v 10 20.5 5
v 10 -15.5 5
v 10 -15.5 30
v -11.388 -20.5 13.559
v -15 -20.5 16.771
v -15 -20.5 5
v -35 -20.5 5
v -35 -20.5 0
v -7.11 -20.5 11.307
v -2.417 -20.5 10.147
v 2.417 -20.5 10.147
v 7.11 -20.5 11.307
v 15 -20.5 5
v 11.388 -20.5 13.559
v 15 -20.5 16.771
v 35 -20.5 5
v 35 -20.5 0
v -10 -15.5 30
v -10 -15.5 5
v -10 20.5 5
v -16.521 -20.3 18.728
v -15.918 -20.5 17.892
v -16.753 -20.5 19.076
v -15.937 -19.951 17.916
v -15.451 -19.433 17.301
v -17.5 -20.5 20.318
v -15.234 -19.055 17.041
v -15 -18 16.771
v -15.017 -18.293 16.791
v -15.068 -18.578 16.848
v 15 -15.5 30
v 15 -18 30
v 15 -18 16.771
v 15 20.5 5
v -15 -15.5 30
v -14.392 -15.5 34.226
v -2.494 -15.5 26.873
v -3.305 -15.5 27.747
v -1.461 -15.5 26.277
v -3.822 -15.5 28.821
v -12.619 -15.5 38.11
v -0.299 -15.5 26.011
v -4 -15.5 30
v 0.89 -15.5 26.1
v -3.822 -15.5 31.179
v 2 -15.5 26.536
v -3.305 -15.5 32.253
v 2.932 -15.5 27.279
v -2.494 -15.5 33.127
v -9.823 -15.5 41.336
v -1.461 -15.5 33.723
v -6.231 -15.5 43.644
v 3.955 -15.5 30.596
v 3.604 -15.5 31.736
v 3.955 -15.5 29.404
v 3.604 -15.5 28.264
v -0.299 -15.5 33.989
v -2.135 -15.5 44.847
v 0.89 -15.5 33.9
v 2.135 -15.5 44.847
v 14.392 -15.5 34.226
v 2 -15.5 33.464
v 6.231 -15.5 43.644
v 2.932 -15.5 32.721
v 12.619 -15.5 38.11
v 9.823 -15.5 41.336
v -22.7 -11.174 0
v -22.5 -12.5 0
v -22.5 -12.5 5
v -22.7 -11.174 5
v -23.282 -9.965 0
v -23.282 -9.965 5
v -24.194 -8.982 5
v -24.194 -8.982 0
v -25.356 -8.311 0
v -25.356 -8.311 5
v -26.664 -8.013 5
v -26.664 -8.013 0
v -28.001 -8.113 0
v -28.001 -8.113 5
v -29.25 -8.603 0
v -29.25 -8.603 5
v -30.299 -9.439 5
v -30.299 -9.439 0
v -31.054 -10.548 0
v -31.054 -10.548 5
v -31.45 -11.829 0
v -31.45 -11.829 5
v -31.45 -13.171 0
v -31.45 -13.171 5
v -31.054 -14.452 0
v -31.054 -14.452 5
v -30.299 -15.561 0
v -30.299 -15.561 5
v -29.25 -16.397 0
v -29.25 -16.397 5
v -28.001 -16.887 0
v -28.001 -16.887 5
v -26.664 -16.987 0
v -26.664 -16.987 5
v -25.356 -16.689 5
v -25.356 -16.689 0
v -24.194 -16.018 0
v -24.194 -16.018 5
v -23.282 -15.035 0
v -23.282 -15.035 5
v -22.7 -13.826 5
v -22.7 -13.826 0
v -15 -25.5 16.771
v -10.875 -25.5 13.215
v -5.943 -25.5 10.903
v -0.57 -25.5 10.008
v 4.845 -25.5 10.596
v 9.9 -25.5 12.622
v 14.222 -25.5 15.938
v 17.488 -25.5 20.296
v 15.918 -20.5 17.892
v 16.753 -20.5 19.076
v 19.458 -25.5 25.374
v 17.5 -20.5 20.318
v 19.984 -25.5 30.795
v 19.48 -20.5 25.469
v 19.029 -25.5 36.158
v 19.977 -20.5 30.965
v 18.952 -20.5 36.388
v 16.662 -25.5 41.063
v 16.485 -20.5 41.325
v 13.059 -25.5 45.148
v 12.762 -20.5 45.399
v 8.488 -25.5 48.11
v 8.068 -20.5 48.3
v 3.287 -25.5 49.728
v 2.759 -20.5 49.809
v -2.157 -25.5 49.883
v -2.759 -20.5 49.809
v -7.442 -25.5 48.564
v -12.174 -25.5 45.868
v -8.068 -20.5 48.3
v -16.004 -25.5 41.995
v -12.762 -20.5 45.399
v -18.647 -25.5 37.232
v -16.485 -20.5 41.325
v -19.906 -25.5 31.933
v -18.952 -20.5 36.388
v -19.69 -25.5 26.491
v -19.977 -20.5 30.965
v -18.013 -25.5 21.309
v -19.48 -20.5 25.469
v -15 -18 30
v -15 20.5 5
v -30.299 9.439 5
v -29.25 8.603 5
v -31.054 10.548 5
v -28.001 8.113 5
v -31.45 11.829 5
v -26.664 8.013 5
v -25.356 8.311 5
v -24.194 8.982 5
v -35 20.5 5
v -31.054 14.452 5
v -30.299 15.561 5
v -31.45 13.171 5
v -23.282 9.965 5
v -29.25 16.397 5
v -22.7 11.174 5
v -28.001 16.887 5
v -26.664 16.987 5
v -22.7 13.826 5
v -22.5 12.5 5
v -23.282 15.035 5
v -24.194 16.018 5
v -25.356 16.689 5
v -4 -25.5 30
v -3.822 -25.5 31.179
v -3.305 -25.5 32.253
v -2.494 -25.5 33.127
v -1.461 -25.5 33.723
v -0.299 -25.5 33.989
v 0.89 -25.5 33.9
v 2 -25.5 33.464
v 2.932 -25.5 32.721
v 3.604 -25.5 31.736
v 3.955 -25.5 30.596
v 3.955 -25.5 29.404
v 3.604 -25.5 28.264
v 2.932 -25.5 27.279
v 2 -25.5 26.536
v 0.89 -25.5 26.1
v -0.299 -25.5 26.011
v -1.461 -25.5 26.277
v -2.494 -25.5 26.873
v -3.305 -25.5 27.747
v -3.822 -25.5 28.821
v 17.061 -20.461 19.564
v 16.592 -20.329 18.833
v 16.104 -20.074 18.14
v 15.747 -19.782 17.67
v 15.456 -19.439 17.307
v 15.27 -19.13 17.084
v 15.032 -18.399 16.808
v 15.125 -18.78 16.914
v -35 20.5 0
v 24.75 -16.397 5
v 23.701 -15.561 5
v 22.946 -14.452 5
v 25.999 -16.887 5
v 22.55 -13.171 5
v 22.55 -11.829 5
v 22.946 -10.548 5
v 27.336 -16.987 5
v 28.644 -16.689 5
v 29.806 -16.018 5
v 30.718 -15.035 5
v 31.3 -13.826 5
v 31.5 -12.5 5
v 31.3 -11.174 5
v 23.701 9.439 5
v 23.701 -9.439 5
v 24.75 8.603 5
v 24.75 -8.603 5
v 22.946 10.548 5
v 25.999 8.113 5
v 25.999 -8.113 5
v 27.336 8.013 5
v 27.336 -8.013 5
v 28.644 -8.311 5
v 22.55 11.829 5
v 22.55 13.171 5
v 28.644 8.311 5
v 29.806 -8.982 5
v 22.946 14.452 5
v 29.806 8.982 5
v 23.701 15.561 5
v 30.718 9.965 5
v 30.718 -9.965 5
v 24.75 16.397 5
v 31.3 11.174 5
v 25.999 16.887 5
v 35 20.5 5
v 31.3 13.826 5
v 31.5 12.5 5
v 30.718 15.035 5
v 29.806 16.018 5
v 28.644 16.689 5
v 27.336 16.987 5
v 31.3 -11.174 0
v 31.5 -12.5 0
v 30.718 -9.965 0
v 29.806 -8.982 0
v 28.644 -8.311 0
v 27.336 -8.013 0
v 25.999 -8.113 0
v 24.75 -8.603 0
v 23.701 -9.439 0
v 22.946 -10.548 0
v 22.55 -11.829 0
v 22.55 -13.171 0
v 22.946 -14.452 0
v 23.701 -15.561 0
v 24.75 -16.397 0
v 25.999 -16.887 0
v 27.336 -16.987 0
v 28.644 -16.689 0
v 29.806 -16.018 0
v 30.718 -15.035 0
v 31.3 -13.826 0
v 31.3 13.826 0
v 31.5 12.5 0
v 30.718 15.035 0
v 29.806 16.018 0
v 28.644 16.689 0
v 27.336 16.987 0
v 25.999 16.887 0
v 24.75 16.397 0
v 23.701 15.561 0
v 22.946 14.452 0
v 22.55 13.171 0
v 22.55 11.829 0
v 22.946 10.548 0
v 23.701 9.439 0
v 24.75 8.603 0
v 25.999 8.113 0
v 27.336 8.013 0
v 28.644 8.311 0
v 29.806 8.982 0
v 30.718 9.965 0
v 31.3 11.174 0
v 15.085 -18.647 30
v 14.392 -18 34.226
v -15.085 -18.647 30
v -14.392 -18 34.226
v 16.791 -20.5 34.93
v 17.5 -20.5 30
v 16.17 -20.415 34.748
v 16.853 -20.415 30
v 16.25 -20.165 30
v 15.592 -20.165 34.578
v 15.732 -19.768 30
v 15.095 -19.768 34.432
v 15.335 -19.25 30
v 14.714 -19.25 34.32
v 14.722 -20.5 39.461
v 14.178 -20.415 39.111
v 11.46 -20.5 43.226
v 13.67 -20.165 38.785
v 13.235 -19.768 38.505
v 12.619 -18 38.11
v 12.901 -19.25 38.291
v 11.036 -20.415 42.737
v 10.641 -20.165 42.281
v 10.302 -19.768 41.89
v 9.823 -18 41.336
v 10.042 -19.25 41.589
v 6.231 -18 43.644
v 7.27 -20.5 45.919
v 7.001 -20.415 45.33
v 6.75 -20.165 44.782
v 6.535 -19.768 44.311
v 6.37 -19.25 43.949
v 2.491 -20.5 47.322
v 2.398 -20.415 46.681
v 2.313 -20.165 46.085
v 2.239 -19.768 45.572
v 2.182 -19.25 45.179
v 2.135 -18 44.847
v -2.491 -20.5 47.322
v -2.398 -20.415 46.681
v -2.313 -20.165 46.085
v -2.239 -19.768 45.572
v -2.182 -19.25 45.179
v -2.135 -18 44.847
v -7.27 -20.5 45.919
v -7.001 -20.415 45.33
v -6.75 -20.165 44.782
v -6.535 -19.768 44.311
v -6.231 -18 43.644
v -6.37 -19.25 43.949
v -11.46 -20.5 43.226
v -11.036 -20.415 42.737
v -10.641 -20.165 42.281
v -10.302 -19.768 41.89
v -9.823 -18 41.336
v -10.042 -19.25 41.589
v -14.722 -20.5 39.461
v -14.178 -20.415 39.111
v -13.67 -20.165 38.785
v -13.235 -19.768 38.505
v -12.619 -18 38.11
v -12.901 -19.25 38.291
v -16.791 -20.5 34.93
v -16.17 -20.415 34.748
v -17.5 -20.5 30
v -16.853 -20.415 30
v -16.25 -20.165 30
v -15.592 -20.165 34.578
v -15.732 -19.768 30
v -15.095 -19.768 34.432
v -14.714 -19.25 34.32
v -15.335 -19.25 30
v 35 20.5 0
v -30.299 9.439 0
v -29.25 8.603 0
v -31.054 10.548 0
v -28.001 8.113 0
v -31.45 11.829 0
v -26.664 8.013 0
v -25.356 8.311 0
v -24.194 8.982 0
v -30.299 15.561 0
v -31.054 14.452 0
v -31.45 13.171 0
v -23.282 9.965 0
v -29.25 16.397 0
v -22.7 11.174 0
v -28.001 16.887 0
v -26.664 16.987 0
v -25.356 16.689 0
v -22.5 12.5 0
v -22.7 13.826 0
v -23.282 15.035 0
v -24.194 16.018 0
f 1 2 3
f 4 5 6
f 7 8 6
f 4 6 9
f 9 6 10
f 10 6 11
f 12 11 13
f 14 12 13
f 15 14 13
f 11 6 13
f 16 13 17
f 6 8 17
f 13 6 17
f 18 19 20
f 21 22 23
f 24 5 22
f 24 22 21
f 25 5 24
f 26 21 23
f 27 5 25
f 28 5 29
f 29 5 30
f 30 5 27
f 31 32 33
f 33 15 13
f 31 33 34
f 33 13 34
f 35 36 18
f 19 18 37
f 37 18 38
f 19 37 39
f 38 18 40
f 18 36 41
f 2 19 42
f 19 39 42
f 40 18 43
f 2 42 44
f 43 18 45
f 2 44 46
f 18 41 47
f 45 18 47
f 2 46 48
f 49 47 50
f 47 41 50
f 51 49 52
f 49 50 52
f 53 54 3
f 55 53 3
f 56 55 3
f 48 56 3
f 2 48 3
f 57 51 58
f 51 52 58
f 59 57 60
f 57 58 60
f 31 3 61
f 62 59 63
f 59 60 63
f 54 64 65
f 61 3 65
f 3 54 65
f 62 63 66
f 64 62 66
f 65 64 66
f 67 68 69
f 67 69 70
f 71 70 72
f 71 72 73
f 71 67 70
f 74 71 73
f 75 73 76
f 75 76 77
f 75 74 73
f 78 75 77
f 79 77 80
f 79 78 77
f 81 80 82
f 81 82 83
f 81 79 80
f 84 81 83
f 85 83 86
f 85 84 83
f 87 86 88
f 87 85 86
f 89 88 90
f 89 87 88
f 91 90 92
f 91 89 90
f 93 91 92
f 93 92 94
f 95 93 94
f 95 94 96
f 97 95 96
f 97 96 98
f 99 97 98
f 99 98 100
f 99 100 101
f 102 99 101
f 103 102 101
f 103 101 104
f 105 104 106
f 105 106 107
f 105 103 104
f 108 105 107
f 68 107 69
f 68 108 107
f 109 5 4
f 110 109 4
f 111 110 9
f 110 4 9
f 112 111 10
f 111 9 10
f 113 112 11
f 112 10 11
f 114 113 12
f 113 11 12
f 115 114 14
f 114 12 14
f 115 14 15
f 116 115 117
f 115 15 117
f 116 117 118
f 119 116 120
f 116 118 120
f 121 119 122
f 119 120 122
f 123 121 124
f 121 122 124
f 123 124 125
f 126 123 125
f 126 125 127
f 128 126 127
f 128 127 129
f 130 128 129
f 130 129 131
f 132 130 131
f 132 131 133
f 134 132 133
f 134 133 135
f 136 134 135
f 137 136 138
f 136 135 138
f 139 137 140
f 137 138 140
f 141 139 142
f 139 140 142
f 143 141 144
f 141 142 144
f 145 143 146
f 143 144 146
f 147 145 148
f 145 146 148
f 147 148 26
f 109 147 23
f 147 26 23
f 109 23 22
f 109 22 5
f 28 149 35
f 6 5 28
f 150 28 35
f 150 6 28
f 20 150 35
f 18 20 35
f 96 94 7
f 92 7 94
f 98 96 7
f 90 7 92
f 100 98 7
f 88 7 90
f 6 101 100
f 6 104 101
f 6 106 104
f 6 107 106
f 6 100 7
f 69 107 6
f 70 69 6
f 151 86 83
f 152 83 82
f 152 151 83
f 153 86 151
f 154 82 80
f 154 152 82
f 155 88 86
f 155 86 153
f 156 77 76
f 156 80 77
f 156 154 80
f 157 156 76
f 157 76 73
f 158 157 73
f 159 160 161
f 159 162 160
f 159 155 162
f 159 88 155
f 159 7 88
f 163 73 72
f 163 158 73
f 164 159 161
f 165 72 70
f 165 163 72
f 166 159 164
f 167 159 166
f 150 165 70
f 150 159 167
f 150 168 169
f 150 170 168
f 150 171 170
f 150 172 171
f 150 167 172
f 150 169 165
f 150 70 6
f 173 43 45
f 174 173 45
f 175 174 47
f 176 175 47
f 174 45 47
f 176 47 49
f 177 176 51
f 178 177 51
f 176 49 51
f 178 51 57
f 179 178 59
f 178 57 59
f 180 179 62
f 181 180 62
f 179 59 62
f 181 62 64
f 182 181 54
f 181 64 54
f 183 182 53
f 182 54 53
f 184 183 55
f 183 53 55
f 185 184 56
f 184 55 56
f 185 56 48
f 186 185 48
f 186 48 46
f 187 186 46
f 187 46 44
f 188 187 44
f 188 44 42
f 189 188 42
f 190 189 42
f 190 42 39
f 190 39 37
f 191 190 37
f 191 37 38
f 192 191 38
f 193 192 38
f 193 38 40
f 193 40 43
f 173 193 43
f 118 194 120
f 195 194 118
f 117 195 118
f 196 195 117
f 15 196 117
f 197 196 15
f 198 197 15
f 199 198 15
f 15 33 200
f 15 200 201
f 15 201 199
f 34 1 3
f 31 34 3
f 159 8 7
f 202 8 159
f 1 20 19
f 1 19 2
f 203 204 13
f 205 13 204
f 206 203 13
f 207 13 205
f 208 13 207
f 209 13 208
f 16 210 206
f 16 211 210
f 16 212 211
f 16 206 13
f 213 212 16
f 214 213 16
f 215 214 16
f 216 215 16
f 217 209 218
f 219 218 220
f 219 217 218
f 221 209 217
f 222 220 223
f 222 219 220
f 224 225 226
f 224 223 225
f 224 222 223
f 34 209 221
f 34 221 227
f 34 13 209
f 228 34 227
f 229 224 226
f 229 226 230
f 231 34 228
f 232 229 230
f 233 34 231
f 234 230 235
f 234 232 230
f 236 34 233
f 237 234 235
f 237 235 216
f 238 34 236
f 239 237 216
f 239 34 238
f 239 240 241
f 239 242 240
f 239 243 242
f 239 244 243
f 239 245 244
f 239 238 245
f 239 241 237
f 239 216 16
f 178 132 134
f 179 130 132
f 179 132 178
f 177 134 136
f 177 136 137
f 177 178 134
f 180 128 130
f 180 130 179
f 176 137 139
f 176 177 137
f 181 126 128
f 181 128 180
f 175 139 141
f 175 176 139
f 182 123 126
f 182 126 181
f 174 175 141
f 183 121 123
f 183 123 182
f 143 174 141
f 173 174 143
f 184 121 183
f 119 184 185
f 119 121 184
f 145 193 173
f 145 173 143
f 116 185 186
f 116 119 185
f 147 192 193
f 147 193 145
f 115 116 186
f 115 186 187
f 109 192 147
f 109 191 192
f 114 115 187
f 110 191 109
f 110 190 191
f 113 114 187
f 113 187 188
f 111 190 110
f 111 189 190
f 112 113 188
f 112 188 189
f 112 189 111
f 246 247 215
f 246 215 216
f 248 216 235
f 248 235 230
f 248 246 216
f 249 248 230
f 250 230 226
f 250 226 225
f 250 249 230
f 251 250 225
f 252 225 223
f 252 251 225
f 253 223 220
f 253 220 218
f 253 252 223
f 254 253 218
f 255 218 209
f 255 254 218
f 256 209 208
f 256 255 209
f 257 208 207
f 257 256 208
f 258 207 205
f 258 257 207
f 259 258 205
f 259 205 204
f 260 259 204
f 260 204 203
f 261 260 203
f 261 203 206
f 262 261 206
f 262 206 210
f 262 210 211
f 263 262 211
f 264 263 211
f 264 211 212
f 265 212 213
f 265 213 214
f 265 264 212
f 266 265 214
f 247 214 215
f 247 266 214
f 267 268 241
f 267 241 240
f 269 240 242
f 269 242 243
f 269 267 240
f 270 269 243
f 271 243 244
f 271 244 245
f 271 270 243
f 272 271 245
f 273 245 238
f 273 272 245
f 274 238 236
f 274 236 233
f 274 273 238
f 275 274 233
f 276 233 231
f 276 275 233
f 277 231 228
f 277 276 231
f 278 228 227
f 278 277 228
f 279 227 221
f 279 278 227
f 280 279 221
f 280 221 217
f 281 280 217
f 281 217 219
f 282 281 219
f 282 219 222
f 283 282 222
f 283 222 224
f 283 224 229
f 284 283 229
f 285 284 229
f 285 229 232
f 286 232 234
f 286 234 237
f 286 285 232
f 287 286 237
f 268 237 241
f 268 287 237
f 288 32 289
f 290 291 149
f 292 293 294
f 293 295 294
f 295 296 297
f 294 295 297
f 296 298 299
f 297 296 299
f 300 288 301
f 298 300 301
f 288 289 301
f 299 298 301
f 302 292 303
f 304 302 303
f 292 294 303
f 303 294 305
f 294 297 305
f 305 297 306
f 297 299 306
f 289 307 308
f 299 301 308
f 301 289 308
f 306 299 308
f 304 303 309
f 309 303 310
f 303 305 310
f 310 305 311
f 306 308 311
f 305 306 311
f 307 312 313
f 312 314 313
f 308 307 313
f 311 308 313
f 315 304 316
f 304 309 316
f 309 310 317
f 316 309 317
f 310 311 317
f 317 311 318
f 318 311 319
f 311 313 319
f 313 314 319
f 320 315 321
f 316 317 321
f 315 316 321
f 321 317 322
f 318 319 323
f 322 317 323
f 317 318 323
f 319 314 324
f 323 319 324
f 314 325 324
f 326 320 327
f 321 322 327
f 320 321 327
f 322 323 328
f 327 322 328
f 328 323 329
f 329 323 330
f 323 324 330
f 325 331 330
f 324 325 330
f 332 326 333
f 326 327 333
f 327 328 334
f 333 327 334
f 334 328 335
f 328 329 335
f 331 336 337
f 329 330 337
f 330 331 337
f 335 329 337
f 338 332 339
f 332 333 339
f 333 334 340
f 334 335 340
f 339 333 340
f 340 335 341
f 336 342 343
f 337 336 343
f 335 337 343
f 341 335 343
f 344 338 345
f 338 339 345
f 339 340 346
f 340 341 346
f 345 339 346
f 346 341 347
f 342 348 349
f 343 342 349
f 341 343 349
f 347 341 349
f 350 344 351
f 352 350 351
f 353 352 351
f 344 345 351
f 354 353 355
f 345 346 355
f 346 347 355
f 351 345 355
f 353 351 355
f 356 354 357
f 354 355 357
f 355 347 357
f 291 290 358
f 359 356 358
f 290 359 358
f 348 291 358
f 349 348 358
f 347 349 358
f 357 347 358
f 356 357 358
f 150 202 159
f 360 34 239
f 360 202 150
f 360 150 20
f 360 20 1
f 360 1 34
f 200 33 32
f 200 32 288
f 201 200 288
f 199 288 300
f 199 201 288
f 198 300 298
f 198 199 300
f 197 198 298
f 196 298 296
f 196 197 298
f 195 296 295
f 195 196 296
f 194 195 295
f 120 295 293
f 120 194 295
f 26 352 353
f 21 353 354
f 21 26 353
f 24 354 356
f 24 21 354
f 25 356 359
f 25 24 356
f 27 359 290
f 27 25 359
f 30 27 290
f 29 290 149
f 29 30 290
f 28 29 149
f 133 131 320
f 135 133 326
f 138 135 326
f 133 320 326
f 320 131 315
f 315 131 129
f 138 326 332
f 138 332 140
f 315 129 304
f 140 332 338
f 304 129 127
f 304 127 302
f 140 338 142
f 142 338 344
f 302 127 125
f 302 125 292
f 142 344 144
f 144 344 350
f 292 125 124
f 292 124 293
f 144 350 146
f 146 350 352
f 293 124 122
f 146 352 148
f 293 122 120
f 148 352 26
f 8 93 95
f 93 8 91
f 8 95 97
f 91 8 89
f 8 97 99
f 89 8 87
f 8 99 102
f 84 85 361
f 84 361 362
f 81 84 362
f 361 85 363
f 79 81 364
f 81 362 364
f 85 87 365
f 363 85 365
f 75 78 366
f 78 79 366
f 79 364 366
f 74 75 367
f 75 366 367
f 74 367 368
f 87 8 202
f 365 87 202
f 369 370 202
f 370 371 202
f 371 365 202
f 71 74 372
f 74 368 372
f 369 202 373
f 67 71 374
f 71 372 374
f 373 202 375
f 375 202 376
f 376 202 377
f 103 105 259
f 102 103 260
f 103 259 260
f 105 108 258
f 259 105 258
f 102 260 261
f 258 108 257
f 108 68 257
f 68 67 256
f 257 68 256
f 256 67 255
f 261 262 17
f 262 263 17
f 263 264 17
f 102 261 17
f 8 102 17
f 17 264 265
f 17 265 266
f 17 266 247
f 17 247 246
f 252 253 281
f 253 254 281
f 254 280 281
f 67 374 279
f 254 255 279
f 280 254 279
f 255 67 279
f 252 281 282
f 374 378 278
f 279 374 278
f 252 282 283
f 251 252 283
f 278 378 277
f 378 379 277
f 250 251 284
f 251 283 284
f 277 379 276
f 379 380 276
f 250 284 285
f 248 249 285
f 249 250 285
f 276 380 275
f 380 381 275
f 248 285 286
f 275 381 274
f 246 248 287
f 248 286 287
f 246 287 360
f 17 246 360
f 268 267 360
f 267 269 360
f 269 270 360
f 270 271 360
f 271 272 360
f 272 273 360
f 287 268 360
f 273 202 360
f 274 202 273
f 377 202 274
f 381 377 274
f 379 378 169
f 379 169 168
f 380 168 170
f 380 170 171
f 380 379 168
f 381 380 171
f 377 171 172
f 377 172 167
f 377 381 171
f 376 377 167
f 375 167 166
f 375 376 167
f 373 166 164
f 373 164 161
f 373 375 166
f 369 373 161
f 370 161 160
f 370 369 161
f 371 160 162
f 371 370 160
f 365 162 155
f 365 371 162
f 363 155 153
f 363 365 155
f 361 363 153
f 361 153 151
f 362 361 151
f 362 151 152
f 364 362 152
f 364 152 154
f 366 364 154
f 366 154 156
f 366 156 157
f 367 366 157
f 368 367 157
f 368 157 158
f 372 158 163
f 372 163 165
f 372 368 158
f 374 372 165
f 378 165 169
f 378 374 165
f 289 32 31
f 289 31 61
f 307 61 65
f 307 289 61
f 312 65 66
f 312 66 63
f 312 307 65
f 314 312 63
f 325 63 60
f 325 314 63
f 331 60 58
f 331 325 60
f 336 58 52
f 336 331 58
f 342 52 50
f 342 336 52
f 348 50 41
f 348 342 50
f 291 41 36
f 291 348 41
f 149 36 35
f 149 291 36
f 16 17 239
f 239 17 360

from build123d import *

# Parameters (mm, degrees)
SKETCH1_W               = 70
SKETCH1_H               = 41
SKETCH1_R               = 4.5
BOSS_EXTRUDE1_DEPTH     = 5
SKETCH2_W               = 5
SKETCH2_H               = 41
BOSS_EXTRUDE2_DEPTH     = 25
BOSS_EXTRUDE3_DEPTH     = 5
CUT_EXTRUDE2_DEPTH      = 61.582588258
CUT_EXTRUDE2_DEPTH_BACK = 61.582588258
SKETCH6_R               = 20
BOSS_EXTRUDE4_DEPTH     = 5
SKETCH7_R               = 4
CUT_EXTRUDE3_DEPTH      = 71.859014952
FILLET1_R               = 2.5


with BuildPart() as part:
    # Sketch1 → Boss-Extrude1 (new body)
    with BuildSketch(Plane.XY):
        Rectangle(SKETCH1_W, SKETCH1_H)
        with Locations((-27, 12.5)):
            Circle(SKETCH1_R, mode=Mode.SUBTRACT)
        with Locations((-27, -12.5)):
            Circle(SKETCH1_R, mode=Mode.SUBTRACT)
        with Locations((27, 12.5)):
            Circle(SKETCH1_R, mode=Mode.SUBTRACT)
        with Locations((27, -12.5)):
            Circle(SKETCH1_R, mode=Mode.SUBTRACT)
    extrude(amount=BOSS_EXTRUDE1_DEPTH)

    # Sketch2 → Boss-Extrude2 (add)
    with BuildSketch(Plane.XY.offset(5)):
        with Locations((-12.5, 0)):
            Rectangle(SKETCH2_W, SKETCH2_H)
        with Locations((12.5, 0)):
            Rectangle(SKETCH2_W, SKETCH2_H)
    extrude(amount=BOSS_EXTRUDE2_DEPTH)

    # Sketch5 → Boss-Extrude3 (add)
    with BuildSketch(Plane.XZ.offset(20.5)):
        with BuildLine():
            Line((-15, 30), (-15, 5))
            Line((-15, 5), (15, 5))
            Line((15, 5), (15, 30))
            ThreePointArc((15, 30), (0, 45), (-15, 30))
        make_face()
    extrude(amount=-BOSS_EXTRUDE3_DEPTH)

    # Sketch3 → Cut-Extrude2 (cut, two sides: drawn at the far end of the back side and taken through both)
    with BuildSketch(Plane(origin=(0, 0, 0), x_dir=(0, 0, -1), z_dir=(1, 0, 0)).offset(-CUT_EXTRUDE2_DEPTH_BACK)):
        Polygon((-5, 20.5), (-30, -15.5), (-49.542972481, -15.5), (-49.542972481, 23.944363396), (-5, 23.944363396), align=None)
    extrude(amount=CUT_EXTRUDE2_DEPTH + CUT_EXTRUDE2_DEPTH_BACK, mode=Mode.SUBTRACT)

    # Sketch6 → Boss-Extrude4 (add)
    with BuildSketch(Plane.XZ.offset(20.5)):
        with Locations(Location((0, 30, 0), (0, 0, 221.409622109))):
            Circle(SKETCH6_R)
    extrude(amount=BOSS_EXTRUDE4_DEPTH)

    # Sketch7 → Cut-Extrude3 (cut, through all)
    with BuildSketch(Plane(origin=(0, -15.5, 0), x_dir=(1, 0, 0), z_dir=(0, 1, 0))):
        with Locations(Location((0, -30, 0), (0, 0, 180))):
            Circle(SKETCH7_R)
    extrude(amount=-CUT_EXTRUDE3_DEPTH, mode=Mode.SUBTRACT)

    # Fillet1
    # the kernel refuses this fillet: 2.5 mm, written as the material it adds along each edge
    with BuildSketch(Plane(origin=(-15, -20.5, 10.521243445), x_dir=(0, 1, 0), z_dir=(0, 0, 1))) as fillet1_piece_1_section:
        with BuildLine():
            CenterArc((FILLET1_R, FILLET1_R), FILLET1_R, 180, 90)
            Line((0, FILLET1_R), (0, 0))
            Line((0, 0), (FILLET1_R, 0))
        make_face()
    fillet1_piece_1 = extrude(amount=19.478756555, mode=Mode.PRIVATE)
    fillet1_piece_1 = fillet1_piece_1 & Plane(origin=(0, -19.928453247, 30), x_dir=(-0.7500000000031269, 0, -0.6614378277626021), z_dir=(0, 1, 0)) * Cylinder(20, 49, mode=Mode.PRIVATE)
    add(fillet1_piece_1)
    with BuildSketch(Plane(origin=(15, -20.5, 10.521243445), x_dir=(0, 1, 0), z_dir=(0, 0, 1))) as fillet1_piece_2_section:
        with BuildLine():
            CenterArc((FILLET1_R, -FILLET1_R), FILLET1_R, 90, 90)
            Line((0, -FILLET1_R), (0, 0))
            Line((0, 0), (FILLET1_R, 0))
        make_face()
    fillet1_piece_2 = extrude(amount=19.478756555, mode=Mode.PRIVATE)
    fillet1_piece_2 = fillet1_piece_2 & Plane(origin=(0, -19.928453234, 30), x_dir=(-0.7500000000031269, 0, -0.6614378277626021), z_dir=(0, 1, 0)) * Cylinder(20, 49, mode=Mode.PRIVATE)
    add(fillet1_piece_2)
    with BuildSketch(Plane(origin=(0, -20.5, 30), x_dir=(1, 0, 0), z_dir=(0, 0, -1))) as fillet1_piece_3:
        with BuildLine():
            CenterArc((15 + FILLET1_R, -FILLET1_R), FILLET1_R, 90, 90)
            Line((15, -FILLET1_R), (15, 0))
            Line((15, 0), (15 + FILLET1_R, 0))
        make_face()
    revolve(axis=Axis((0, -20.5, 30), (0, -1, 0)), revolution_arc=180)


solid = part.part
